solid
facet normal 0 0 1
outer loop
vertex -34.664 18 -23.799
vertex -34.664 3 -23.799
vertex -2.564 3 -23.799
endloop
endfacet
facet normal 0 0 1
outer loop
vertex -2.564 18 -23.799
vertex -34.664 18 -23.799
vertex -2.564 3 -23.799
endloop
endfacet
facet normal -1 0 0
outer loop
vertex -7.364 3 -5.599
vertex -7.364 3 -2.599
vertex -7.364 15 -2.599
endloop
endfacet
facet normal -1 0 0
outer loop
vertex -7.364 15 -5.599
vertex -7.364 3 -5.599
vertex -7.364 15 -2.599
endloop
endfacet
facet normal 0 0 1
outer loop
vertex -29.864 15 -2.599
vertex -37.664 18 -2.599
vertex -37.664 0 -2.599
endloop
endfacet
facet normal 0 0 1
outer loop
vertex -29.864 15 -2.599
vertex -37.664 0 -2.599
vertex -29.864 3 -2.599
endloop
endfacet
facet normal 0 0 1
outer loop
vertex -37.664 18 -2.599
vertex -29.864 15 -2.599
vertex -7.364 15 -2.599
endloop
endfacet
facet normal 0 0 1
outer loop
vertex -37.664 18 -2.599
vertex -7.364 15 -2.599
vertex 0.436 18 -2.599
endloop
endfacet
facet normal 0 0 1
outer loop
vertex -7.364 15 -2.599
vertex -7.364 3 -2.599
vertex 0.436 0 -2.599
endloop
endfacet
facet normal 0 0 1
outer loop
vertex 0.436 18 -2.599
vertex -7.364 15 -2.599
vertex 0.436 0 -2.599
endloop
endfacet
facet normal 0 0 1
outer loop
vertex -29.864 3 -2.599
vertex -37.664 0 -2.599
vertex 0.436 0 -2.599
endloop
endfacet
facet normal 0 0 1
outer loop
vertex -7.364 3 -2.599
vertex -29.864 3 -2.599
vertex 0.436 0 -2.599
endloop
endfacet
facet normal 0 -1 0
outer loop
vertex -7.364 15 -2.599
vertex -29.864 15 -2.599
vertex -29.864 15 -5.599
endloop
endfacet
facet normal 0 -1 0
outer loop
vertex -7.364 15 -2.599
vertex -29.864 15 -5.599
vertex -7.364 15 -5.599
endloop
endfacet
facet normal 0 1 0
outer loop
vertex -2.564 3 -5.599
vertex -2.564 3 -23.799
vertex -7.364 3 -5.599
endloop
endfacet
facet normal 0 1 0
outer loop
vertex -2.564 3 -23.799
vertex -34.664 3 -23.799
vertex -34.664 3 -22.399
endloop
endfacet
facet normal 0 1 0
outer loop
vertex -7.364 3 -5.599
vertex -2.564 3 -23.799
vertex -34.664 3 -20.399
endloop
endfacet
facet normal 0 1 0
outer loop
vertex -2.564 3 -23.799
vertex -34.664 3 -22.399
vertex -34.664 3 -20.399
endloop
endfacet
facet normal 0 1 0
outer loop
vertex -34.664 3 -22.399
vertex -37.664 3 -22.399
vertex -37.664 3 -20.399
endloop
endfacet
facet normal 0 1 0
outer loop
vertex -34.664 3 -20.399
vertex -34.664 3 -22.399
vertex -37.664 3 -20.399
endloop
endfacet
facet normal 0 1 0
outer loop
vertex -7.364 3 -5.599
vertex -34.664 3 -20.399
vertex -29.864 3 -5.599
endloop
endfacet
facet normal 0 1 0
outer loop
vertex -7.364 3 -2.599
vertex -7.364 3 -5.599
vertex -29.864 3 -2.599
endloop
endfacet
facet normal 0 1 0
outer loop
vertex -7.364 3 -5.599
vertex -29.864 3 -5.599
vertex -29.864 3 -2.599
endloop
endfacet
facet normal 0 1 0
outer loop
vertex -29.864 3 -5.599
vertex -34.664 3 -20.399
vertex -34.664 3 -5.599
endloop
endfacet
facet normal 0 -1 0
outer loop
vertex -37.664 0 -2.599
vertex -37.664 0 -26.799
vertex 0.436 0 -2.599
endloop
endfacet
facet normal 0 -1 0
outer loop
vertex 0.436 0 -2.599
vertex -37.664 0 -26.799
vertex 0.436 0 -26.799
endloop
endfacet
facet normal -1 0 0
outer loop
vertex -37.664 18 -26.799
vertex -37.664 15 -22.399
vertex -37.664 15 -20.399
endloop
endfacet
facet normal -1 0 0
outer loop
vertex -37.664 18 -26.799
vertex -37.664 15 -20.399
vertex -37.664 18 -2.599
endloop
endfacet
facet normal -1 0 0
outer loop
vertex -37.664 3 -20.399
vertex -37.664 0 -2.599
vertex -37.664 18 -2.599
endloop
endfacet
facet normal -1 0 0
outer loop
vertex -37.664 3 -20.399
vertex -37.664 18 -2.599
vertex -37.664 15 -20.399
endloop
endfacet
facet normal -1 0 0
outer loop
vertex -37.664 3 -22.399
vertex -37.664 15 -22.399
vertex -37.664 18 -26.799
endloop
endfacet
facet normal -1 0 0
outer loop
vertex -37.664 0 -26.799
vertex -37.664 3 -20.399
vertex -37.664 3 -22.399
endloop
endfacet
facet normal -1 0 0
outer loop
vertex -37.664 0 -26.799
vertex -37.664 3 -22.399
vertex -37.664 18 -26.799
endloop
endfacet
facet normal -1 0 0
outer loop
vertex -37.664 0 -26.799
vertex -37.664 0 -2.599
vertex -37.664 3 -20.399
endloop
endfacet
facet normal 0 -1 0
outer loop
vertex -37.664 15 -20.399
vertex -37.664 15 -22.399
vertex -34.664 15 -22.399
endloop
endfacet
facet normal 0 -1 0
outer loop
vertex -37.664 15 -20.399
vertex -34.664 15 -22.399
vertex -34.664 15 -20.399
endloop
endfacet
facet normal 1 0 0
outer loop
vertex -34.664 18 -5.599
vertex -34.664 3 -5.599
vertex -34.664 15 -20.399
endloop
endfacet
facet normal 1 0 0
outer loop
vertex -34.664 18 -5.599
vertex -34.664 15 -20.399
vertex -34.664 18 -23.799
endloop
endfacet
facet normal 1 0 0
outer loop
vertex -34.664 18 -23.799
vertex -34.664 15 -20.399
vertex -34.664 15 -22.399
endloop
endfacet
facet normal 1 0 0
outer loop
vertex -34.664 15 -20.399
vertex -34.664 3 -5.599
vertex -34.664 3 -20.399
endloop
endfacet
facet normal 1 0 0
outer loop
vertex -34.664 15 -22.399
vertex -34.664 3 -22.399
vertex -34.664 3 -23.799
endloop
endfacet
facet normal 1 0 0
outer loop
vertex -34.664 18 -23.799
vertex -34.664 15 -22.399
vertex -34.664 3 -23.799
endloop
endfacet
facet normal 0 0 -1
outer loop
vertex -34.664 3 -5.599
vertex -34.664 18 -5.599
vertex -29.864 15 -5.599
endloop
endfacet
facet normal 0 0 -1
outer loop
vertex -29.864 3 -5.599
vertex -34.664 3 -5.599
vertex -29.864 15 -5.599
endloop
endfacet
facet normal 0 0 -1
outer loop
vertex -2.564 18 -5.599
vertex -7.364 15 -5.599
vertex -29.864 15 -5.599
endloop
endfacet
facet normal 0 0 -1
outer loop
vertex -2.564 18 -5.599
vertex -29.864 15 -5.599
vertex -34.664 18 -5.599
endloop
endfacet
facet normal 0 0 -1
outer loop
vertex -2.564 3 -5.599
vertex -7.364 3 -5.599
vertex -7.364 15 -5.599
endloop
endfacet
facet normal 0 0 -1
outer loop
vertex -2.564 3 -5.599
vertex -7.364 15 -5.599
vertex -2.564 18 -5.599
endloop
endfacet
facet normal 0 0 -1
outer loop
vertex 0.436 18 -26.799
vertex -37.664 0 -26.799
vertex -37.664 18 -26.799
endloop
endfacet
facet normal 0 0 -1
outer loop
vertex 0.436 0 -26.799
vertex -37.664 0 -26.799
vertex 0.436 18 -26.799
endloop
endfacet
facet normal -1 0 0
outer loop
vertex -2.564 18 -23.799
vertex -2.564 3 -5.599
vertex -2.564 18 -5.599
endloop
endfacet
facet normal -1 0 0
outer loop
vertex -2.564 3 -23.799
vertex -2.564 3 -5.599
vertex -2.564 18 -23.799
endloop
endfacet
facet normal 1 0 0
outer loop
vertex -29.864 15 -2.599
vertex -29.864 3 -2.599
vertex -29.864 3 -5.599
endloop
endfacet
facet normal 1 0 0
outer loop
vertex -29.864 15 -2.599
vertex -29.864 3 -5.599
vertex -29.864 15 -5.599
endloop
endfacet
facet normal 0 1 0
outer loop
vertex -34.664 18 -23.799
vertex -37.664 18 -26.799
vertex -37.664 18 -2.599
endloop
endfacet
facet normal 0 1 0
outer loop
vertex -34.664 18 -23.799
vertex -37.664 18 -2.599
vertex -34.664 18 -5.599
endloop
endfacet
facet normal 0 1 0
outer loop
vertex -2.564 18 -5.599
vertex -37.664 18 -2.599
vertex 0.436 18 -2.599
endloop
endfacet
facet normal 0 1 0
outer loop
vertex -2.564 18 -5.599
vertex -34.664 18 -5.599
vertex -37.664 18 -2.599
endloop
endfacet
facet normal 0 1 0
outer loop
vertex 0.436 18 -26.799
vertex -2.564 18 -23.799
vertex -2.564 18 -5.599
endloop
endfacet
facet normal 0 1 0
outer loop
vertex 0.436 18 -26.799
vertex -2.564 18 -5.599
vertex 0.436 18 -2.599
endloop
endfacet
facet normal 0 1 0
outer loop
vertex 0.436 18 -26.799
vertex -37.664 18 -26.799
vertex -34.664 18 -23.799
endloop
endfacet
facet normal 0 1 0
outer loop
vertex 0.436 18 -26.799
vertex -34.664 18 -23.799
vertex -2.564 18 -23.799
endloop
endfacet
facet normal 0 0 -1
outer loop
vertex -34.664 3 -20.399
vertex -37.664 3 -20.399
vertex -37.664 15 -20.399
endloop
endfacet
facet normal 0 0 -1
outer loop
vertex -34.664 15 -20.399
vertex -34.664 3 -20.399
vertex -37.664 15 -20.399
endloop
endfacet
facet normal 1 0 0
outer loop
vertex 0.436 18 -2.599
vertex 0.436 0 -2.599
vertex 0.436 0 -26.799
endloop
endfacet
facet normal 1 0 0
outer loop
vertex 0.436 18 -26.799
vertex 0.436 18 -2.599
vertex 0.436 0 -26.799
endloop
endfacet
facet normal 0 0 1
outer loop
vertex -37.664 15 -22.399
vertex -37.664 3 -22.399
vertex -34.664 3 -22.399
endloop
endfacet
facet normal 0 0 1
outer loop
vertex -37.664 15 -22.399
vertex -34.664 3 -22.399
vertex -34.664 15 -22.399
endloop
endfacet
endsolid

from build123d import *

# Parameters (mm, degrees)
SKETCH1_W           = 38.1
SKETCH1_H           = 24.2
BOSS_EXTRUDE1_DEPTH = 18
SHELL1_T            = -3
SKETCH2_W           = 22.5
SKETCH2_H           = 12
CUT_EXTRUDE1_DEPTH  = 3
SKETCH3_W           = 2
SKETCH3_H           = 12
CUT_EXTRUDE2_DEPTH  = 3


with BuildPart() as part:
    # Sketch1 → Boss-Extrude1 (new body)
    with BuildSketch(Plane(origin=(0, 0, 0), x_dir=(1, 0, 0), z_dir=(0, 1, 0))):
        with Locations((-18.614066742, 14.699432105)):
            Rectangle(SKETCH1_W, SKETCH1_H)
    extrude(amount=BOSS_EXTRUDE1_DEPTH)

    # Shell1
    shell1_openings = [part.faces().sort_by_distance(p)[0] for p in [
        (-18.614066742, 18, -14.699432105),
    ]]
    offset(amount=SHELL1_T, openings=shell1_openings, kind=Kind.INTERSECTION)

    # Sketch2 → Cut-Extrude1 (cut)
    with BuildSketch(Plane.XY.offset(-2.599432105)):
        with Locations((-18.614066742, 9)):
            Rectangle(SKETCH2_W, SKETCH2_H)
    extrude(amount=-CUT_EXTRUDE1_DEPTH, mode=Mode.SUBTRACT)

    # Sketch3 → Cut-Extrude2 (cut)
    with BuildSketch(Plane.ZY.offset(37.664066742)):
        with Locations((-21.399432105, 9)):
            Rectangle(SKETCH3_W, SKETCH3_H)
    extrude(amount=-CUT_EXTRUDE2_DEPTH, mode=Mode.SUBTRACT)


solid = part.part
